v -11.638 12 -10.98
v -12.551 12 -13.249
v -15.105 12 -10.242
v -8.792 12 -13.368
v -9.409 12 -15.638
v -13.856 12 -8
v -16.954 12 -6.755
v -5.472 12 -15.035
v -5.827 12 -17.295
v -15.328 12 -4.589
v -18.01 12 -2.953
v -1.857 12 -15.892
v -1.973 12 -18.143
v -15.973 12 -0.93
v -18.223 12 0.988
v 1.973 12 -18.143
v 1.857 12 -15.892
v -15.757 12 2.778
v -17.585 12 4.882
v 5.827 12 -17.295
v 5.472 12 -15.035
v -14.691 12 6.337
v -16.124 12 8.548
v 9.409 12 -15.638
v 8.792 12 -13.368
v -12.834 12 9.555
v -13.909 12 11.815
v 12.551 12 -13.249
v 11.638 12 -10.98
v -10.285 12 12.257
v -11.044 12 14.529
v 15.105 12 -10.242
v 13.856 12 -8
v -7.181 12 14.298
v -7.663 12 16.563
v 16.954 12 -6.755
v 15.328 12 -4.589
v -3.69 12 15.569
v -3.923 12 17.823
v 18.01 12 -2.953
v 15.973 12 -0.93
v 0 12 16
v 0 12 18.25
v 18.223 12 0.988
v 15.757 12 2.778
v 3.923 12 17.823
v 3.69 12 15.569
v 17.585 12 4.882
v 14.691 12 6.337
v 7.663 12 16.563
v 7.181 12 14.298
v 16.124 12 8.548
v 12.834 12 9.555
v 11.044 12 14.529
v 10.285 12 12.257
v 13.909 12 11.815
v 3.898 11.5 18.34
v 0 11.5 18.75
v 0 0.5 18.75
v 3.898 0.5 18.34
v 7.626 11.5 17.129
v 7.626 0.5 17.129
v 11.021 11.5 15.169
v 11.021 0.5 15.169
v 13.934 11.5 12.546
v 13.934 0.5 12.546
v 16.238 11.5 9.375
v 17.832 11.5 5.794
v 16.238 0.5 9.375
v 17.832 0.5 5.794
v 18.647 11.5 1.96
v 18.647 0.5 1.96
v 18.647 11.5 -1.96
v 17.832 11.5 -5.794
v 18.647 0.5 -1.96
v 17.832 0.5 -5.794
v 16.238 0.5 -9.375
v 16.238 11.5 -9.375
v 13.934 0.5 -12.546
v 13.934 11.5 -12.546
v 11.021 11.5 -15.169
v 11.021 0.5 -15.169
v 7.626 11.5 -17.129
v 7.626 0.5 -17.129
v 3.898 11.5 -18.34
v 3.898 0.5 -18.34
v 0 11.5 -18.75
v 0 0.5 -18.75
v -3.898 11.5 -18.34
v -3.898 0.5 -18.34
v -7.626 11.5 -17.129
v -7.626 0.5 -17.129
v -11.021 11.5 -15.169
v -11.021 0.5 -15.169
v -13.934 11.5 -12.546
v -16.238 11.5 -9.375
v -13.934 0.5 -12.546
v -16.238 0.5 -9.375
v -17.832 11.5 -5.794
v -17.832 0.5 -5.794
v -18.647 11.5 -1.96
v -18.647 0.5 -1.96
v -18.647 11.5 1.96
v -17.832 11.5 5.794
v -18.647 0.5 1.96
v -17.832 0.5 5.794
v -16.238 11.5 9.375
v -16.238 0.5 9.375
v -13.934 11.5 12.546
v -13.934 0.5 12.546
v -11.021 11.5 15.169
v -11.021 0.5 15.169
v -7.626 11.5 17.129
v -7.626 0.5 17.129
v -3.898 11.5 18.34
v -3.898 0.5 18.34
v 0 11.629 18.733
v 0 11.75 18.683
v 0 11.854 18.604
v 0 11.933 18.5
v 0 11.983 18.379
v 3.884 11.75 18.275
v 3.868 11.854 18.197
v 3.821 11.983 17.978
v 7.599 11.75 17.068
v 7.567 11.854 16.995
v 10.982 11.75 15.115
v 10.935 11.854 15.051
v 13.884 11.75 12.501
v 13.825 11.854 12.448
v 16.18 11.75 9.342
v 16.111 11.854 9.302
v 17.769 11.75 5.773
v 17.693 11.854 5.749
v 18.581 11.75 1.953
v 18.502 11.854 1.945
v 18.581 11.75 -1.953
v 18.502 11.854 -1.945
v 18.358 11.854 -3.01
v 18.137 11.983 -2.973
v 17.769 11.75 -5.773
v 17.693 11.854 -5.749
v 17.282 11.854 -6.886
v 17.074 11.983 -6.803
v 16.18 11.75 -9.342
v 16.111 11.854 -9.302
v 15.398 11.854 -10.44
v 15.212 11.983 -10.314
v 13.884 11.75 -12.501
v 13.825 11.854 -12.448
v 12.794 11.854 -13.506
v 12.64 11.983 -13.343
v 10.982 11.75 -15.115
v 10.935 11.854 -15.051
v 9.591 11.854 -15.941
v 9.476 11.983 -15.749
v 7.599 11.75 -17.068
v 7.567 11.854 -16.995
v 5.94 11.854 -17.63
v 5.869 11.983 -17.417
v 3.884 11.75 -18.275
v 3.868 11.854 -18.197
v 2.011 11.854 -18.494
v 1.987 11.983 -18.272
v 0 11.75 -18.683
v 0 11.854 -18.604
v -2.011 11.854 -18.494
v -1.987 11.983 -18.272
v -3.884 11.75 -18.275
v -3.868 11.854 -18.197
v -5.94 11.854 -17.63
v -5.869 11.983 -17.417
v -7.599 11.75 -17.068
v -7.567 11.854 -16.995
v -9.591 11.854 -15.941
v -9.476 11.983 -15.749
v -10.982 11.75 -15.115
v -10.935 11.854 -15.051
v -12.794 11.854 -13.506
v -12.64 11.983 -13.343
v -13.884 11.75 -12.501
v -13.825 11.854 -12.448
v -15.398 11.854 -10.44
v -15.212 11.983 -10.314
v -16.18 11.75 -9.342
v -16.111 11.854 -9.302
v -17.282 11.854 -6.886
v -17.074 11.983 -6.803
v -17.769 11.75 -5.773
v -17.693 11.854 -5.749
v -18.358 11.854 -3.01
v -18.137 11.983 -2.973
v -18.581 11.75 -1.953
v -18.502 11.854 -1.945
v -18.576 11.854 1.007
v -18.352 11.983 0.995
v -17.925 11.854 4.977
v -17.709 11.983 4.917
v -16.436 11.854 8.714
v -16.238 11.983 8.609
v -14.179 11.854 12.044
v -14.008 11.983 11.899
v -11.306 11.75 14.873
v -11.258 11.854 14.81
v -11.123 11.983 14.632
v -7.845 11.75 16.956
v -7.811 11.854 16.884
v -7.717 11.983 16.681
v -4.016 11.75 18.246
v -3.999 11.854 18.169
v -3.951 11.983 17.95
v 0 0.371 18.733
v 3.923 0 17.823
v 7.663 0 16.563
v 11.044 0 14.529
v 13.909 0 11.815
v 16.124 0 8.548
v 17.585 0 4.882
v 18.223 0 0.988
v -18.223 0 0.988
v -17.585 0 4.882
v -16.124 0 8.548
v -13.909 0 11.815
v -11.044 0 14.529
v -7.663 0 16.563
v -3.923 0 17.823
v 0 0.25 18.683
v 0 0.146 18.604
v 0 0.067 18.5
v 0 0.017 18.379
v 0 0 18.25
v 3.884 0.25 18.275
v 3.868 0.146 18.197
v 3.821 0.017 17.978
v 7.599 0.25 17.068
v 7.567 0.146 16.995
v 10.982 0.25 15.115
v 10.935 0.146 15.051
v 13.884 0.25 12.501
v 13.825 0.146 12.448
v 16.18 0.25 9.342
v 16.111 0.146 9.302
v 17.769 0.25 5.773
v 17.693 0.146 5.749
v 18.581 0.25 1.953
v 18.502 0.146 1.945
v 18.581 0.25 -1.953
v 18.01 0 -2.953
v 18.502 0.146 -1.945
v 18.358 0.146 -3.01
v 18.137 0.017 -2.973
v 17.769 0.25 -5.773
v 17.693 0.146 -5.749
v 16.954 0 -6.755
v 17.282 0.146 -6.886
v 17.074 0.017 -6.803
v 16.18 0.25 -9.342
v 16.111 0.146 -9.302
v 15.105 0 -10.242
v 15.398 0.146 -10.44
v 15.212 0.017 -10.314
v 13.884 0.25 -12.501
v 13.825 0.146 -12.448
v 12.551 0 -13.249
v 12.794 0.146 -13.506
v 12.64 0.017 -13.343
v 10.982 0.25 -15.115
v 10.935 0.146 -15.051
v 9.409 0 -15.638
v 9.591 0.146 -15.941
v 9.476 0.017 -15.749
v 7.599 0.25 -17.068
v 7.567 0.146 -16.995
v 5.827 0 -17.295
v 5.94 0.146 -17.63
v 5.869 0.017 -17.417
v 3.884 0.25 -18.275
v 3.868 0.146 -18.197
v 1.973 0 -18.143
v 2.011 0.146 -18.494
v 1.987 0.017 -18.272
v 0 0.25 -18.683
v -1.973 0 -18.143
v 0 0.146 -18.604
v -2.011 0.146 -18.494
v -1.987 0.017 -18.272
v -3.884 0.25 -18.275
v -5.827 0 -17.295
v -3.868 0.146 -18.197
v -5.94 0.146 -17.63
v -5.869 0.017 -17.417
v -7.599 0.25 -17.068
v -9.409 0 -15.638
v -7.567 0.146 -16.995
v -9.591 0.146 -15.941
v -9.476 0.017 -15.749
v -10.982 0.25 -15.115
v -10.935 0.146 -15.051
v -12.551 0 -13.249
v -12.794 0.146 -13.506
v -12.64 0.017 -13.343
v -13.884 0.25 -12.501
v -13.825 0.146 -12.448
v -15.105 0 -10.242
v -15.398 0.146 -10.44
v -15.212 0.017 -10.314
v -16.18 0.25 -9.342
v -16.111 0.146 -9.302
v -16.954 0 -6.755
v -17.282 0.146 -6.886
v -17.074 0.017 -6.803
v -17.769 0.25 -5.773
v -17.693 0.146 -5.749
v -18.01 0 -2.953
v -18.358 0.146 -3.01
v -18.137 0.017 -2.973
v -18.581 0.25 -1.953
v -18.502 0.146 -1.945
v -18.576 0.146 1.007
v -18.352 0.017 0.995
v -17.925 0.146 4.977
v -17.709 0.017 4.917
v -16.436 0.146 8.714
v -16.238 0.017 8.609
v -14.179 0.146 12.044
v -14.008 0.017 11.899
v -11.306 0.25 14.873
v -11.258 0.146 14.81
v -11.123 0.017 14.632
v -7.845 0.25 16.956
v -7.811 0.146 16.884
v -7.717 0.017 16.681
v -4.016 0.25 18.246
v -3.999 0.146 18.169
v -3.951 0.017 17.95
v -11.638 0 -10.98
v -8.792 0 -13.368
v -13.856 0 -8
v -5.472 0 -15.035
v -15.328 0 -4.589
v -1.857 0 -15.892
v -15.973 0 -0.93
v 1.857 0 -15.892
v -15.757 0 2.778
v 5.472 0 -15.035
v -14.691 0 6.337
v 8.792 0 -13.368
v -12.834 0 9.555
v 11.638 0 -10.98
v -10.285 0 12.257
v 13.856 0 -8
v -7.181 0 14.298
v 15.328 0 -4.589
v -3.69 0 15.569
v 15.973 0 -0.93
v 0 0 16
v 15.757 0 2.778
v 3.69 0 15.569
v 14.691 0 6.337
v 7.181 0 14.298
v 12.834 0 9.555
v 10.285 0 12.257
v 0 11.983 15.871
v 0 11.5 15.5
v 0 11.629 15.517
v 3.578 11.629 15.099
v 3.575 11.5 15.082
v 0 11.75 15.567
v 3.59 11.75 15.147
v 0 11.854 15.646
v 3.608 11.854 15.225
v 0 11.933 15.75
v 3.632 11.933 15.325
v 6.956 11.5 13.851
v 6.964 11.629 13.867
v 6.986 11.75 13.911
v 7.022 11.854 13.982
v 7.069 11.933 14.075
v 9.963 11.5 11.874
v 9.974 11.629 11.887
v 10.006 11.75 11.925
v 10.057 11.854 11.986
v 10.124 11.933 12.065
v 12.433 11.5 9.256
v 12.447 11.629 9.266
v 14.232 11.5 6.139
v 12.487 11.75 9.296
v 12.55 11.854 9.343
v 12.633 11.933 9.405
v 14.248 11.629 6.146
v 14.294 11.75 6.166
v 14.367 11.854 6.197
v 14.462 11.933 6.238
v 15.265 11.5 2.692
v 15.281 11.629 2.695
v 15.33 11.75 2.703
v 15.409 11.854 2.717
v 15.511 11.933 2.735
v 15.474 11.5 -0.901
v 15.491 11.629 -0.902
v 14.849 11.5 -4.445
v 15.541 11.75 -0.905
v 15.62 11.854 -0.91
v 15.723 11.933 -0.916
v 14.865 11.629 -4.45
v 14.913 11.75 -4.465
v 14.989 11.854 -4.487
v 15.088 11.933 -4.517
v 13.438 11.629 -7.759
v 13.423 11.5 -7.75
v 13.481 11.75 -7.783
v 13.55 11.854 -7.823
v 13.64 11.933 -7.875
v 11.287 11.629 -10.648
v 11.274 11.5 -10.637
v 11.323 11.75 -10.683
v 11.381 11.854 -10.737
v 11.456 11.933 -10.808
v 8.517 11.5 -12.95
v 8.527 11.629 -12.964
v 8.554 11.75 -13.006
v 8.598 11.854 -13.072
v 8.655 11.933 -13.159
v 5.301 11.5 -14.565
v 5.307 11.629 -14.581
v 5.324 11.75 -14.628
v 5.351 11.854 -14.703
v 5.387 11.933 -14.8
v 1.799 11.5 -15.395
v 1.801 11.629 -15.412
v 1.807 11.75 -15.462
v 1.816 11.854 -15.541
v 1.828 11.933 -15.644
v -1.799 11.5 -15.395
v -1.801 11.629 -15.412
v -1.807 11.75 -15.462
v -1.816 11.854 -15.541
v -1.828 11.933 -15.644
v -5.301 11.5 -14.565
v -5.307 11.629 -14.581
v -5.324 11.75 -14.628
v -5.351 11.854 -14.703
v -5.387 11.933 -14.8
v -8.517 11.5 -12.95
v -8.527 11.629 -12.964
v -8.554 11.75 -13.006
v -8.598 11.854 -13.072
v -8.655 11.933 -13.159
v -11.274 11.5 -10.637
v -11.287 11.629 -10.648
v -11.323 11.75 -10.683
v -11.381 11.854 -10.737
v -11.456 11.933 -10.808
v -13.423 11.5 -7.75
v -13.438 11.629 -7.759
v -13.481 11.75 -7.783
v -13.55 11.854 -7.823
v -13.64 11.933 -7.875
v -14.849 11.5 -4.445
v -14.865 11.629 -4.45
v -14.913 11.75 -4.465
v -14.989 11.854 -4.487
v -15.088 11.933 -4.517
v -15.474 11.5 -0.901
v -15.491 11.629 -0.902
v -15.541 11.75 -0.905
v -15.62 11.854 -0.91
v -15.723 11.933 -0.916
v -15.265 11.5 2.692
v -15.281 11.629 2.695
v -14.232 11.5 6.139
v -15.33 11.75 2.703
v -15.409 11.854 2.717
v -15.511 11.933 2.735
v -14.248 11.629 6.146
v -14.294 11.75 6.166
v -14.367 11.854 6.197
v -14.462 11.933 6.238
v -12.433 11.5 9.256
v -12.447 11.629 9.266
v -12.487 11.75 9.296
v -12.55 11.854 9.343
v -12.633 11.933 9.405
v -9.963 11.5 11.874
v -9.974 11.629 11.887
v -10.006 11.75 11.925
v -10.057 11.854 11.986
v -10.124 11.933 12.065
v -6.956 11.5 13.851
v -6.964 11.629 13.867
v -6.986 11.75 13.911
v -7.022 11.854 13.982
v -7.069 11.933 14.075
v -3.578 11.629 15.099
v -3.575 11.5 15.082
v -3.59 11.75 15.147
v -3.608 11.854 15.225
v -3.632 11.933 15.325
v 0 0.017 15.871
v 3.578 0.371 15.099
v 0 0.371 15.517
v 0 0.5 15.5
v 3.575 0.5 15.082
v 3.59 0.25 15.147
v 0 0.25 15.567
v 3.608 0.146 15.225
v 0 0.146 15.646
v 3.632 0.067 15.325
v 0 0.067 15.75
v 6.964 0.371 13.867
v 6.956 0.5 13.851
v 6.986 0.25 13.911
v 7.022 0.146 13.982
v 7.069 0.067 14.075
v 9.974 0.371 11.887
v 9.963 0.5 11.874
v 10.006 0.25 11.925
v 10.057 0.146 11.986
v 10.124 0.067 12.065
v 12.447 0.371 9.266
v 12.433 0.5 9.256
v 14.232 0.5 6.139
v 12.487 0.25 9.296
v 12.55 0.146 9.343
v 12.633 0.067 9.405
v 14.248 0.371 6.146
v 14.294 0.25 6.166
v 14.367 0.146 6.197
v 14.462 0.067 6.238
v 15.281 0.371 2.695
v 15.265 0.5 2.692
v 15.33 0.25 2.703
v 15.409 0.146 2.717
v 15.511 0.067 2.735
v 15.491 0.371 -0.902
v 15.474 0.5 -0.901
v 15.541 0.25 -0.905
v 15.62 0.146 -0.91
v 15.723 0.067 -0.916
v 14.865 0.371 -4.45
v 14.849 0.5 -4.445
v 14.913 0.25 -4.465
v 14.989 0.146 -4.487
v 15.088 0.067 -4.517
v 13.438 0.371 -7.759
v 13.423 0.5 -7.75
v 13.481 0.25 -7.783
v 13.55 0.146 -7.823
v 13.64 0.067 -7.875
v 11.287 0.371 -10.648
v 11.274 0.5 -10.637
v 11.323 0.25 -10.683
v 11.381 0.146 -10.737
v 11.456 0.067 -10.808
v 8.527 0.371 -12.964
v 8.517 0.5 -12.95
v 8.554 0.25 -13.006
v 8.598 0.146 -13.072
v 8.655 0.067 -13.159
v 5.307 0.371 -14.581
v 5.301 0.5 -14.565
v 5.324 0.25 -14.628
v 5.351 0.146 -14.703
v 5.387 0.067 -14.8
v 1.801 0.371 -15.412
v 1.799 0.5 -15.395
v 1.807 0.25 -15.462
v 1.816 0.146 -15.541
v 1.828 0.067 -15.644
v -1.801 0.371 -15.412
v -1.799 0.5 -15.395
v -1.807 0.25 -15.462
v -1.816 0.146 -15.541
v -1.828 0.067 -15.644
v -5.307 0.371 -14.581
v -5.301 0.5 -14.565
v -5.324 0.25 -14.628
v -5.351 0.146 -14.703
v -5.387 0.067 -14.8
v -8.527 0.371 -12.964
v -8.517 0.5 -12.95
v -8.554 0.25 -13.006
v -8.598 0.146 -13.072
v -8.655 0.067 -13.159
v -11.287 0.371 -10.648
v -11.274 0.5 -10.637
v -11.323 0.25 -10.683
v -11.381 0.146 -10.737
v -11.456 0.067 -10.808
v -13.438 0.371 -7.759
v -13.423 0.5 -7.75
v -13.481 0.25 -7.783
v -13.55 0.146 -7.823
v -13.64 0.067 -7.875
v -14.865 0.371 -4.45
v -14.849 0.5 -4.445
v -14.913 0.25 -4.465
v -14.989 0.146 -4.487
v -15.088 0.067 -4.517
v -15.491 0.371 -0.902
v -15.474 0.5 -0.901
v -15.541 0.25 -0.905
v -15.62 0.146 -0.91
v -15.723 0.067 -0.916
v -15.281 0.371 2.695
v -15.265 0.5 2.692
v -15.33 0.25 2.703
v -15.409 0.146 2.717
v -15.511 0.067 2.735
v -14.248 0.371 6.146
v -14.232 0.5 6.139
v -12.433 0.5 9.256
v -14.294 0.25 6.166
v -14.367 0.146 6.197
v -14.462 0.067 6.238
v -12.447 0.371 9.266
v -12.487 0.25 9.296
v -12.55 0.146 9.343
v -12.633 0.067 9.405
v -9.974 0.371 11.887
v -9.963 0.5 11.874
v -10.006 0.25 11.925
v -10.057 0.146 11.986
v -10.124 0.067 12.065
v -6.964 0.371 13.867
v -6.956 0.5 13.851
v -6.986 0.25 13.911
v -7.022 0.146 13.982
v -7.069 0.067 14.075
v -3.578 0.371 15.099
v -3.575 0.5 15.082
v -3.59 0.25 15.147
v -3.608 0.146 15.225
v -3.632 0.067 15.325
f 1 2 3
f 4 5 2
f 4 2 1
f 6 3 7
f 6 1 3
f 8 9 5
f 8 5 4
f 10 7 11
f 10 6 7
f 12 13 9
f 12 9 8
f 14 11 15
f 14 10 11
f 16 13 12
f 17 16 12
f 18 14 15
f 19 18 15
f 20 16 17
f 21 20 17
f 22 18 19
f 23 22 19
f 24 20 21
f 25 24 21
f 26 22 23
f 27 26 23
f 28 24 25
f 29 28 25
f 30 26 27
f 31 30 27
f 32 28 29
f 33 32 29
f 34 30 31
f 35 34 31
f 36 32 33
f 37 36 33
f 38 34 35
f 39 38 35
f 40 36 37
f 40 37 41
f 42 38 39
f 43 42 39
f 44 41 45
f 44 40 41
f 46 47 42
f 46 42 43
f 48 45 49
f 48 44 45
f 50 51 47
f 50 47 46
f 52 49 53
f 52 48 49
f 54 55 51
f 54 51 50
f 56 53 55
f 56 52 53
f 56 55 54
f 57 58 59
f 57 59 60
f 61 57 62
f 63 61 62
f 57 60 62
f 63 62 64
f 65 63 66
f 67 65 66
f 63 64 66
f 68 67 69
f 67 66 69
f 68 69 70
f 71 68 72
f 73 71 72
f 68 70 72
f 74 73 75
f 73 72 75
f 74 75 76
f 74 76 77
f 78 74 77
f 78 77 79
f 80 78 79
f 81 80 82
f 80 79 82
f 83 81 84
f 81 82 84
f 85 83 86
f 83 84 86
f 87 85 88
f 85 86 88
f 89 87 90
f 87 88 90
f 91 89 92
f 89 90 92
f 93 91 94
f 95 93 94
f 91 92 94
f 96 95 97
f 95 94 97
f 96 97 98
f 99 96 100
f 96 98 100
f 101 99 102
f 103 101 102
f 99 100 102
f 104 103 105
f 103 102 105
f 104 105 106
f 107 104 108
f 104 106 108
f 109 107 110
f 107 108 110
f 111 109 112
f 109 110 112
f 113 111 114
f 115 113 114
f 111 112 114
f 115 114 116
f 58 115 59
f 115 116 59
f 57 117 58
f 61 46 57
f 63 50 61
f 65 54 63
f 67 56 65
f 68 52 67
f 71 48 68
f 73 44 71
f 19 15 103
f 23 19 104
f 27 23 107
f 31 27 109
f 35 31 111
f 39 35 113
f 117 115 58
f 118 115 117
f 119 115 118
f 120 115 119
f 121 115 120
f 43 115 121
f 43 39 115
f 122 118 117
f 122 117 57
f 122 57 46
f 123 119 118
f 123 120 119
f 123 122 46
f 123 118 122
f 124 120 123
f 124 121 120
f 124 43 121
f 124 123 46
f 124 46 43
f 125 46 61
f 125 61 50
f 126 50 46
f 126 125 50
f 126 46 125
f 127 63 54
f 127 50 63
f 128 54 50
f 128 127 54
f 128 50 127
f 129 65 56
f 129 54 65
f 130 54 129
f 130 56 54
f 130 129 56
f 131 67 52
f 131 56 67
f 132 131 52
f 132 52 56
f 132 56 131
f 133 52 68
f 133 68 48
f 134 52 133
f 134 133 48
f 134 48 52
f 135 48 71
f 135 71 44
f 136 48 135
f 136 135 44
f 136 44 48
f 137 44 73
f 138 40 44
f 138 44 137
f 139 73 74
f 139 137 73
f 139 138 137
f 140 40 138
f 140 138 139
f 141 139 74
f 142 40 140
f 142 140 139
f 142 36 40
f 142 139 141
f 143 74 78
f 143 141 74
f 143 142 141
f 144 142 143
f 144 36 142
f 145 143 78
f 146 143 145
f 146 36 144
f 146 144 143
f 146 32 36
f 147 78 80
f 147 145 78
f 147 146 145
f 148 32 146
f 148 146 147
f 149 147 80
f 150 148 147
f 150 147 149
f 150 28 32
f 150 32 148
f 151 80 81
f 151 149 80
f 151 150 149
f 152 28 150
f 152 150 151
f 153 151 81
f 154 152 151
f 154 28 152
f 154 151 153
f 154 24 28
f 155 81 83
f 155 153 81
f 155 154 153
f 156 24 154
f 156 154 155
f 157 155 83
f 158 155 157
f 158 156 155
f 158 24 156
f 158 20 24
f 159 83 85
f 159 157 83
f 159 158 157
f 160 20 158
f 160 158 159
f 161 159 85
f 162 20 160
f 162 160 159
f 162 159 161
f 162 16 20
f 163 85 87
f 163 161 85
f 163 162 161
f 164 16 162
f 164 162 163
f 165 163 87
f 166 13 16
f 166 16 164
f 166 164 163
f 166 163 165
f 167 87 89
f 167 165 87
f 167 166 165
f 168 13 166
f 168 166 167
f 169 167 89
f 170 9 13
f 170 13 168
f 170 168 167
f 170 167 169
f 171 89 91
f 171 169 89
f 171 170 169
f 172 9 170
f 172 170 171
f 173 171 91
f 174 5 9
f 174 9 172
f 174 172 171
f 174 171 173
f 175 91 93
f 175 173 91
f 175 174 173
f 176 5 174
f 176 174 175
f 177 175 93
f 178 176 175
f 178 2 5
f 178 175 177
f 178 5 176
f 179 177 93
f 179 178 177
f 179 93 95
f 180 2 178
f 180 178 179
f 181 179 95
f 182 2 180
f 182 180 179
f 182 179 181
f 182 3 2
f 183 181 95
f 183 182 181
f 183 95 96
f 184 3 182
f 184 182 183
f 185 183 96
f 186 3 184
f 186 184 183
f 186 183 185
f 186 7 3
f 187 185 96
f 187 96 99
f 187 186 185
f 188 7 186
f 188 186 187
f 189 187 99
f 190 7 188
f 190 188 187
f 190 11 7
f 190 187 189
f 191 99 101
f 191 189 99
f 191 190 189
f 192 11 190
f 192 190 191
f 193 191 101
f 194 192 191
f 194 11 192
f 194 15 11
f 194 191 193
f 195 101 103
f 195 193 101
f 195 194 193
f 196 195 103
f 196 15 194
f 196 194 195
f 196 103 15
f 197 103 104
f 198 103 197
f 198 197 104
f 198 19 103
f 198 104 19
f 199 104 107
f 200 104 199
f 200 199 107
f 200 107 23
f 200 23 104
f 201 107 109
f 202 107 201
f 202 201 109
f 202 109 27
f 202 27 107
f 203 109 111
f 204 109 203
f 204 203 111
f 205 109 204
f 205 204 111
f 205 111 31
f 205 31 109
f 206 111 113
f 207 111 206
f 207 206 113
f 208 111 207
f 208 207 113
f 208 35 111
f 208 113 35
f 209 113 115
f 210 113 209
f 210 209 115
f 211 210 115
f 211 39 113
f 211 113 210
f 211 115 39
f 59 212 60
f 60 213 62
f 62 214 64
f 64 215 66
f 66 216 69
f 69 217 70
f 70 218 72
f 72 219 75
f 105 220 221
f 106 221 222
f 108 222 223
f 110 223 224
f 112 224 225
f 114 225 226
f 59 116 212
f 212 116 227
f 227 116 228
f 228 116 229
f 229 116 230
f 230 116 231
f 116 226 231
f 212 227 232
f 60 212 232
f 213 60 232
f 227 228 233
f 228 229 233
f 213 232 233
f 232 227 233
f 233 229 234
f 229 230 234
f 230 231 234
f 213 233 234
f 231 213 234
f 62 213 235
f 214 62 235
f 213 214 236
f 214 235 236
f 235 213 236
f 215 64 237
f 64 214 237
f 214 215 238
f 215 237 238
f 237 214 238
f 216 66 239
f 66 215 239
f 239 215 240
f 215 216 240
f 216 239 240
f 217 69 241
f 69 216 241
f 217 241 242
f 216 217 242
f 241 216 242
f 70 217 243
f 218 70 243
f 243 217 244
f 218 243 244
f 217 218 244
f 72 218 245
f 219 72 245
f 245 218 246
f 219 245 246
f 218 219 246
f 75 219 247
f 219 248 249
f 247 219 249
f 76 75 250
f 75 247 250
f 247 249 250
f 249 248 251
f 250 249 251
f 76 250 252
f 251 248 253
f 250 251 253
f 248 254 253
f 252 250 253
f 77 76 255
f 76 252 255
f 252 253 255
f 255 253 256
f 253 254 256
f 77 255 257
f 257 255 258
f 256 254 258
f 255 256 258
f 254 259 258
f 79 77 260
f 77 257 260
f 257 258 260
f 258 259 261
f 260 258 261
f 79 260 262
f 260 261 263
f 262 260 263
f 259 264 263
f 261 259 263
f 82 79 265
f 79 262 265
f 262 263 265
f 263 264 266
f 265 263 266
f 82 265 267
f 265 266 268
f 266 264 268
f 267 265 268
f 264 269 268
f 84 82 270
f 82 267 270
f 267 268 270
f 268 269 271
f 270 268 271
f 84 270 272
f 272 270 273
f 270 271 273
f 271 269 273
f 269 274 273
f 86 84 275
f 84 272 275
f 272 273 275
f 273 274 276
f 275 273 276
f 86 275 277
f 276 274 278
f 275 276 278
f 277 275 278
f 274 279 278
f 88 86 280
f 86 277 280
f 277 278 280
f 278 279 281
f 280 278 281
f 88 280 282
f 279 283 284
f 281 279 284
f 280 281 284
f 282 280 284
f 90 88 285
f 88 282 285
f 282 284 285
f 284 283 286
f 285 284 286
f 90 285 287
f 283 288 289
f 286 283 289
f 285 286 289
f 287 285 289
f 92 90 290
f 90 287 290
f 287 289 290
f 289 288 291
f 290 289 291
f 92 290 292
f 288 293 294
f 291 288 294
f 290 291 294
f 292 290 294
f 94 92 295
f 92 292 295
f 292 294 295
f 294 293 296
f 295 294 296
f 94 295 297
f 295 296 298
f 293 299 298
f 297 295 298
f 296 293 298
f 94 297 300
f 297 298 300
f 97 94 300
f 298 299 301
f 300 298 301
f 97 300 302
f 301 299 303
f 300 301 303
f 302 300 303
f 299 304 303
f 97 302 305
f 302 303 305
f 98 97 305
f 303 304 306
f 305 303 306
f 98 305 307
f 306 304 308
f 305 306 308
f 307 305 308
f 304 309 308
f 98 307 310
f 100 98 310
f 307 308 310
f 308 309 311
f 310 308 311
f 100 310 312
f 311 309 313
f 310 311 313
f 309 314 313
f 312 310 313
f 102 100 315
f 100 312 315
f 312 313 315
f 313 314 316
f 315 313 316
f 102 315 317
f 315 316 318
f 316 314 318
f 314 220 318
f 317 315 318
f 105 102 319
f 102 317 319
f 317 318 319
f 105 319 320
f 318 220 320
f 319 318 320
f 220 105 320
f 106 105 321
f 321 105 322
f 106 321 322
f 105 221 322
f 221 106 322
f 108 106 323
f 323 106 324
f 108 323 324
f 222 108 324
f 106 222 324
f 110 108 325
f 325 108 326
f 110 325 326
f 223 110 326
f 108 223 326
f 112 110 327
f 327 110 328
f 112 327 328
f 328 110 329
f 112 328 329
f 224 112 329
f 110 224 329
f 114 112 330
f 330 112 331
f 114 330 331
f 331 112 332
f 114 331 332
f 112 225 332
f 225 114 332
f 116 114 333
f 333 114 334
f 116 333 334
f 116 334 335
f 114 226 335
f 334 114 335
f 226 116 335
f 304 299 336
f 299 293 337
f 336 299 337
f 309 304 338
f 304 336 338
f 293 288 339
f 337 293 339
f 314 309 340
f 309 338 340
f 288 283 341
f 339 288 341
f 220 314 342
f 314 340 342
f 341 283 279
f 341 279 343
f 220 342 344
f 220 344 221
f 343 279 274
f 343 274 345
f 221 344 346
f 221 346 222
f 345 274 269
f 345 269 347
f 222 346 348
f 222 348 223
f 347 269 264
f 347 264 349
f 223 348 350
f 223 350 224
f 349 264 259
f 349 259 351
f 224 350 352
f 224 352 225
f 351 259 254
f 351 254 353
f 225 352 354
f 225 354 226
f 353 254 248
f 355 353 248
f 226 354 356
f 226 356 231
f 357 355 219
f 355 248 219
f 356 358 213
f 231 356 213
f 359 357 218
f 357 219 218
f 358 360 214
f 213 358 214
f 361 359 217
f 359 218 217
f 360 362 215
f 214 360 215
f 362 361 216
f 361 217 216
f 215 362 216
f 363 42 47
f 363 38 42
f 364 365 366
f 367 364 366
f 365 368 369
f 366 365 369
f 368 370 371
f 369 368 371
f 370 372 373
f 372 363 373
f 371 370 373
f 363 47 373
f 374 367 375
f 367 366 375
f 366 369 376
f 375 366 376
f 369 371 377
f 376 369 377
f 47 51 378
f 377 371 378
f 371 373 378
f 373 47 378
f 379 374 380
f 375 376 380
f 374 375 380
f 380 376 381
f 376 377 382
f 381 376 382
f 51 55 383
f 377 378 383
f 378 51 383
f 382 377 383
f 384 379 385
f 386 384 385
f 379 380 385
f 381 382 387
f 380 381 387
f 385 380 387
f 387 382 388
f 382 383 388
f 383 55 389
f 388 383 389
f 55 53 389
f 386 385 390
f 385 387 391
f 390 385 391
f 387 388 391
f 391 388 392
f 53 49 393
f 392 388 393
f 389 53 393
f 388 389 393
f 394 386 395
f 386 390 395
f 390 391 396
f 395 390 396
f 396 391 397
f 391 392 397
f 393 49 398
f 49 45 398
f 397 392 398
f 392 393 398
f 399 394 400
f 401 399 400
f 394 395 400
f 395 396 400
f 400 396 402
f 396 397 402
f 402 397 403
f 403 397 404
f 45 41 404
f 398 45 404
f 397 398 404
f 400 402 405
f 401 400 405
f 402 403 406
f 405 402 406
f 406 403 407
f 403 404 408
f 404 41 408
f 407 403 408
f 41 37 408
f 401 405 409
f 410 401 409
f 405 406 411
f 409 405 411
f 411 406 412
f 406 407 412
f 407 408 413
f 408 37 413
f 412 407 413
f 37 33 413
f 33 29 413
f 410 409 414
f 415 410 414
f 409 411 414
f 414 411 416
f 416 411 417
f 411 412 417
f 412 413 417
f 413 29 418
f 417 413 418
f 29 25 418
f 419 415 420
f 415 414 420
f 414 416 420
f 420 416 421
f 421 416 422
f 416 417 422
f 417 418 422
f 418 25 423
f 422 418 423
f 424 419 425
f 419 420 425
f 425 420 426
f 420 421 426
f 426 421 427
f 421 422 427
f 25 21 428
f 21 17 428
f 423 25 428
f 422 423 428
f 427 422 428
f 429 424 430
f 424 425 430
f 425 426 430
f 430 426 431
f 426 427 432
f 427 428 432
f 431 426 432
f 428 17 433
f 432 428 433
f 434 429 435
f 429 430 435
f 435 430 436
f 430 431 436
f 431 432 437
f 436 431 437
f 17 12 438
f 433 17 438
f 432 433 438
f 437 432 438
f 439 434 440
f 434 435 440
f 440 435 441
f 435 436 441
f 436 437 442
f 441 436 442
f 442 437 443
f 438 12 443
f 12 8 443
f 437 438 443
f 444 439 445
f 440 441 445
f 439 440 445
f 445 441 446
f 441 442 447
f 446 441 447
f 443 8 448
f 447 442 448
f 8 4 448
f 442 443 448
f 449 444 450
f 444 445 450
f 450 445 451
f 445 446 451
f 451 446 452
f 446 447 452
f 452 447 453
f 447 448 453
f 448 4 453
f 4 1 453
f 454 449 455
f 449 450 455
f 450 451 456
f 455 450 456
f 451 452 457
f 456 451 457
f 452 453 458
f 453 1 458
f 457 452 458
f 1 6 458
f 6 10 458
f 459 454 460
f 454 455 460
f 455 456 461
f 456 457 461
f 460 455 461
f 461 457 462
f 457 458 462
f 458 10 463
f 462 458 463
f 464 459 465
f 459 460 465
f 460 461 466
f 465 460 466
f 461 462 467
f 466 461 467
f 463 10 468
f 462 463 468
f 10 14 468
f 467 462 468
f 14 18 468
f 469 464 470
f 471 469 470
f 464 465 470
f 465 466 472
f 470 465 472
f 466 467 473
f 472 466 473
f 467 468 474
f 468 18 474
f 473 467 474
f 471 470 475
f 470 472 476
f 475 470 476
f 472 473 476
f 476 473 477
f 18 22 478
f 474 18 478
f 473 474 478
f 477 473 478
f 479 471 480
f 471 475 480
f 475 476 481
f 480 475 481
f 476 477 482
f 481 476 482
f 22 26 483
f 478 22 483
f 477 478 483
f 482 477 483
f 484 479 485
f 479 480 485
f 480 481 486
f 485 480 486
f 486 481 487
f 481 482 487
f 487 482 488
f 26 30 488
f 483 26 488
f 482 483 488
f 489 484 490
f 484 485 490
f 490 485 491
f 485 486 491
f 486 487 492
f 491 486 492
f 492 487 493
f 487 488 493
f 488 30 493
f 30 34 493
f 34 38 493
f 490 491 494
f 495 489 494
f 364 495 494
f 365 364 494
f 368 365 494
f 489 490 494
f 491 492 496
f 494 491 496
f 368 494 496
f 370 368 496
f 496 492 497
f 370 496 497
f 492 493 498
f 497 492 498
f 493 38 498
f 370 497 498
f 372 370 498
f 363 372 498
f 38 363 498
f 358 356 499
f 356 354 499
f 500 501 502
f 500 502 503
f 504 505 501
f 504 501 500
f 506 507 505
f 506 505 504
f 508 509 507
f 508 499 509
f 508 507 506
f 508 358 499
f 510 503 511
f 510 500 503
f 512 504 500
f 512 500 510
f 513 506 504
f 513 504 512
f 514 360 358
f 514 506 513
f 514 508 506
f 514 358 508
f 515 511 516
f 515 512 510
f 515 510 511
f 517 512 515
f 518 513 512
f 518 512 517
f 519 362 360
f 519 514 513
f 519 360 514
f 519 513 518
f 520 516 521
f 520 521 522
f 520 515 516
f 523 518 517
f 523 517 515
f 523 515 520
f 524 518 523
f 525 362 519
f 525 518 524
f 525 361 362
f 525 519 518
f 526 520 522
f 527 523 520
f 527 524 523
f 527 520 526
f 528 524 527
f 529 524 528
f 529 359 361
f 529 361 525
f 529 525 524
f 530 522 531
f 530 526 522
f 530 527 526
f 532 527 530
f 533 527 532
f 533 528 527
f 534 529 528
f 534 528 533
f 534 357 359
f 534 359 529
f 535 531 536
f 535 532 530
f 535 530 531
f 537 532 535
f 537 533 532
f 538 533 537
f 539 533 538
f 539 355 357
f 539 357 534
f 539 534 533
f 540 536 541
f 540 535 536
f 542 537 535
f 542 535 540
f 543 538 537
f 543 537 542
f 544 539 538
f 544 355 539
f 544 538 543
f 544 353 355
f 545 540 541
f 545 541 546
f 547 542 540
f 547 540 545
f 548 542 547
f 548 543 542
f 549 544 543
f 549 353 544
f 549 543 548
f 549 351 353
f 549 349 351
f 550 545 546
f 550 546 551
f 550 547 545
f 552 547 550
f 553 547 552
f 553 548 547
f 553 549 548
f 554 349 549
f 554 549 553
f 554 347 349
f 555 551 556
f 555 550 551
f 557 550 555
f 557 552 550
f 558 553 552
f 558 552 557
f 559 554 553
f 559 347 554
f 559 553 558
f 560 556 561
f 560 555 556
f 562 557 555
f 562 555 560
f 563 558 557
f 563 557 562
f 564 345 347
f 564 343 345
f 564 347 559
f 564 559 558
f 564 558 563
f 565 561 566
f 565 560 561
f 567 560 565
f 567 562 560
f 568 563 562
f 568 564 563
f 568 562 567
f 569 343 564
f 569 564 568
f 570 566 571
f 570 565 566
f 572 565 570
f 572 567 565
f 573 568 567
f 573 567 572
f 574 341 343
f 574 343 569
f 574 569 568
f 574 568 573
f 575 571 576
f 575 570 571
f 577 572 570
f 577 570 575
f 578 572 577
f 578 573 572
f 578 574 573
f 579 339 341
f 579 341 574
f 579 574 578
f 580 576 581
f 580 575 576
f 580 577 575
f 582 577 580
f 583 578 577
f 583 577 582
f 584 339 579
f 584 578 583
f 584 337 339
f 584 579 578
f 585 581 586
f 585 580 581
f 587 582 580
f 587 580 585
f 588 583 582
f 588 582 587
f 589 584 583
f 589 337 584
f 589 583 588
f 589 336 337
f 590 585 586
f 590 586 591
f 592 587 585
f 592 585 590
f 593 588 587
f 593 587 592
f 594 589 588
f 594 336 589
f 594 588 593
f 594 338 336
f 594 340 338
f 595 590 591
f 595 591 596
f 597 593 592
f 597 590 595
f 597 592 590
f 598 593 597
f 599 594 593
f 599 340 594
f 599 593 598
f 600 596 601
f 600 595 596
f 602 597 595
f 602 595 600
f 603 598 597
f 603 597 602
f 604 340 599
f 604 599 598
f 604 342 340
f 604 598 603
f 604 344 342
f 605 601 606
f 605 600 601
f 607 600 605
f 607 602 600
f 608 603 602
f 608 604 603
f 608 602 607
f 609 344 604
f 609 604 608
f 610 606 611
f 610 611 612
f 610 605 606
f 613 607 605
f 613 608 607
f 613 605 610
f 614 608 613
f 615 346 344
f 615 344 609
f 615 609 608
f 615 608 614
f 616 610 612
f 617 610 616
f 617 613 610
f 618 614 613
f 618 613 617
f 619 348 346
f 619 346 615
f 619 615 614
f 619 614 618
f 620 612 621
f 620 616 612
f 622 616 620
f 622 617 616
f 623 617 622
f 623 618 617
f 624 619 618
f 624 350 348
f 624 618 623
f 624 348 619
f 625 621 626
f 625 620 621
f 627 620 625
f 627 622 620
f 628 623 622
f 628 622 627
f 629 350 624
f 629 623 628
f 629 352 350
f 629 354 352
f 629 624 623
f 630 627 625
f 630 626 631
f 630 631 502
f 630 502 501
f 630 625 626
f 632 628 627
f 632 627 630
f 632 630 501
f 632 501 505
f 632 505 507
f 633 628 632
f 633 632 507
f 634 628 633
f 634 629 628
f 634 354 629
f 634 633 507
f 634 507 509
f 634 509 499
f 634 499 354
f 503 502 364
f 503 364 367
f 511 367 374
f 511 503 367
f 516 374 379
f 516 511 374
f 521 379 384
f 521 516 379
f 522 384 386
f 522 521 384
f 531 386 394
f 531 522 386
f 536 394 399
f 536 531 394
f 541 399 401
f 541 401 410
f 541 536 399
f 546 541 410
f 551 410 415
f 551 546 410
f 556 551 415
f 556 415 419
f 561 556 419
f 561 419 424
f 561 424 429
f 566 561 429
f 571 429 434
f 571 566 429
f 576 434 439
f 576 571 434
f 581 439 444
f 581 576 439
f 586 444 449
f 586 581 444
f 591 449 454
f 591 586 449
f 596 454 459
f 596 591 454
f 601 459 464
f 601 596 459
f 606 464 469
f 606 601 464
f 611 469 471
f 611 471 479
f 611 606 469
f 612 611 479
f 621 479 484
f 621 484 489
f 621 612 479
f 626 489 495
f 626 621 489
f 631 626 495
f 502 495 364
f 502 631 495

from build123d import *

# Parameters (mm, degrees)
ESQUISSE1_R        = 18.75
ESQUISSE1_R_2      = 15.5
BOSS_EXTRU_1_DEPTH = 12
CONG_1_R           = 0.5


with BuildPart() as part:
    # Esquisse1 → Boss.-Extru.1 (new body)
    with BuildSketch(Plane(origin=(0, 0, 0), x_dir=(1, 0, 0), z_dir=(0, 1, 0))):
        with Locations(Location((0, 0, 0), (0, 0, 270))):  # turned: the seam where the file's is
            Circle(ESQUISSE1_R)
        with Locations(Location((0, 0, 0), (0, 0, 270))):  # turned: the seam where the file's is
            Circle(ESQUISSE1_R_2, mode=Mode.SUBTRACT)
    extrude(amount=BOSS_EXTRU_1_DEPTH)

    # Congé1
    cong_1_edges = [part.edges().sort_by_distance(p)[0] for p in [
        (0, 0, -18.75),
        (0, 12, -18.75),
        (0, 0, -15.5),
        (0, 12, -15.5),
    ]]
    fillet(cong_1_edges, radius=CONG_1_R)


solid = part.part
